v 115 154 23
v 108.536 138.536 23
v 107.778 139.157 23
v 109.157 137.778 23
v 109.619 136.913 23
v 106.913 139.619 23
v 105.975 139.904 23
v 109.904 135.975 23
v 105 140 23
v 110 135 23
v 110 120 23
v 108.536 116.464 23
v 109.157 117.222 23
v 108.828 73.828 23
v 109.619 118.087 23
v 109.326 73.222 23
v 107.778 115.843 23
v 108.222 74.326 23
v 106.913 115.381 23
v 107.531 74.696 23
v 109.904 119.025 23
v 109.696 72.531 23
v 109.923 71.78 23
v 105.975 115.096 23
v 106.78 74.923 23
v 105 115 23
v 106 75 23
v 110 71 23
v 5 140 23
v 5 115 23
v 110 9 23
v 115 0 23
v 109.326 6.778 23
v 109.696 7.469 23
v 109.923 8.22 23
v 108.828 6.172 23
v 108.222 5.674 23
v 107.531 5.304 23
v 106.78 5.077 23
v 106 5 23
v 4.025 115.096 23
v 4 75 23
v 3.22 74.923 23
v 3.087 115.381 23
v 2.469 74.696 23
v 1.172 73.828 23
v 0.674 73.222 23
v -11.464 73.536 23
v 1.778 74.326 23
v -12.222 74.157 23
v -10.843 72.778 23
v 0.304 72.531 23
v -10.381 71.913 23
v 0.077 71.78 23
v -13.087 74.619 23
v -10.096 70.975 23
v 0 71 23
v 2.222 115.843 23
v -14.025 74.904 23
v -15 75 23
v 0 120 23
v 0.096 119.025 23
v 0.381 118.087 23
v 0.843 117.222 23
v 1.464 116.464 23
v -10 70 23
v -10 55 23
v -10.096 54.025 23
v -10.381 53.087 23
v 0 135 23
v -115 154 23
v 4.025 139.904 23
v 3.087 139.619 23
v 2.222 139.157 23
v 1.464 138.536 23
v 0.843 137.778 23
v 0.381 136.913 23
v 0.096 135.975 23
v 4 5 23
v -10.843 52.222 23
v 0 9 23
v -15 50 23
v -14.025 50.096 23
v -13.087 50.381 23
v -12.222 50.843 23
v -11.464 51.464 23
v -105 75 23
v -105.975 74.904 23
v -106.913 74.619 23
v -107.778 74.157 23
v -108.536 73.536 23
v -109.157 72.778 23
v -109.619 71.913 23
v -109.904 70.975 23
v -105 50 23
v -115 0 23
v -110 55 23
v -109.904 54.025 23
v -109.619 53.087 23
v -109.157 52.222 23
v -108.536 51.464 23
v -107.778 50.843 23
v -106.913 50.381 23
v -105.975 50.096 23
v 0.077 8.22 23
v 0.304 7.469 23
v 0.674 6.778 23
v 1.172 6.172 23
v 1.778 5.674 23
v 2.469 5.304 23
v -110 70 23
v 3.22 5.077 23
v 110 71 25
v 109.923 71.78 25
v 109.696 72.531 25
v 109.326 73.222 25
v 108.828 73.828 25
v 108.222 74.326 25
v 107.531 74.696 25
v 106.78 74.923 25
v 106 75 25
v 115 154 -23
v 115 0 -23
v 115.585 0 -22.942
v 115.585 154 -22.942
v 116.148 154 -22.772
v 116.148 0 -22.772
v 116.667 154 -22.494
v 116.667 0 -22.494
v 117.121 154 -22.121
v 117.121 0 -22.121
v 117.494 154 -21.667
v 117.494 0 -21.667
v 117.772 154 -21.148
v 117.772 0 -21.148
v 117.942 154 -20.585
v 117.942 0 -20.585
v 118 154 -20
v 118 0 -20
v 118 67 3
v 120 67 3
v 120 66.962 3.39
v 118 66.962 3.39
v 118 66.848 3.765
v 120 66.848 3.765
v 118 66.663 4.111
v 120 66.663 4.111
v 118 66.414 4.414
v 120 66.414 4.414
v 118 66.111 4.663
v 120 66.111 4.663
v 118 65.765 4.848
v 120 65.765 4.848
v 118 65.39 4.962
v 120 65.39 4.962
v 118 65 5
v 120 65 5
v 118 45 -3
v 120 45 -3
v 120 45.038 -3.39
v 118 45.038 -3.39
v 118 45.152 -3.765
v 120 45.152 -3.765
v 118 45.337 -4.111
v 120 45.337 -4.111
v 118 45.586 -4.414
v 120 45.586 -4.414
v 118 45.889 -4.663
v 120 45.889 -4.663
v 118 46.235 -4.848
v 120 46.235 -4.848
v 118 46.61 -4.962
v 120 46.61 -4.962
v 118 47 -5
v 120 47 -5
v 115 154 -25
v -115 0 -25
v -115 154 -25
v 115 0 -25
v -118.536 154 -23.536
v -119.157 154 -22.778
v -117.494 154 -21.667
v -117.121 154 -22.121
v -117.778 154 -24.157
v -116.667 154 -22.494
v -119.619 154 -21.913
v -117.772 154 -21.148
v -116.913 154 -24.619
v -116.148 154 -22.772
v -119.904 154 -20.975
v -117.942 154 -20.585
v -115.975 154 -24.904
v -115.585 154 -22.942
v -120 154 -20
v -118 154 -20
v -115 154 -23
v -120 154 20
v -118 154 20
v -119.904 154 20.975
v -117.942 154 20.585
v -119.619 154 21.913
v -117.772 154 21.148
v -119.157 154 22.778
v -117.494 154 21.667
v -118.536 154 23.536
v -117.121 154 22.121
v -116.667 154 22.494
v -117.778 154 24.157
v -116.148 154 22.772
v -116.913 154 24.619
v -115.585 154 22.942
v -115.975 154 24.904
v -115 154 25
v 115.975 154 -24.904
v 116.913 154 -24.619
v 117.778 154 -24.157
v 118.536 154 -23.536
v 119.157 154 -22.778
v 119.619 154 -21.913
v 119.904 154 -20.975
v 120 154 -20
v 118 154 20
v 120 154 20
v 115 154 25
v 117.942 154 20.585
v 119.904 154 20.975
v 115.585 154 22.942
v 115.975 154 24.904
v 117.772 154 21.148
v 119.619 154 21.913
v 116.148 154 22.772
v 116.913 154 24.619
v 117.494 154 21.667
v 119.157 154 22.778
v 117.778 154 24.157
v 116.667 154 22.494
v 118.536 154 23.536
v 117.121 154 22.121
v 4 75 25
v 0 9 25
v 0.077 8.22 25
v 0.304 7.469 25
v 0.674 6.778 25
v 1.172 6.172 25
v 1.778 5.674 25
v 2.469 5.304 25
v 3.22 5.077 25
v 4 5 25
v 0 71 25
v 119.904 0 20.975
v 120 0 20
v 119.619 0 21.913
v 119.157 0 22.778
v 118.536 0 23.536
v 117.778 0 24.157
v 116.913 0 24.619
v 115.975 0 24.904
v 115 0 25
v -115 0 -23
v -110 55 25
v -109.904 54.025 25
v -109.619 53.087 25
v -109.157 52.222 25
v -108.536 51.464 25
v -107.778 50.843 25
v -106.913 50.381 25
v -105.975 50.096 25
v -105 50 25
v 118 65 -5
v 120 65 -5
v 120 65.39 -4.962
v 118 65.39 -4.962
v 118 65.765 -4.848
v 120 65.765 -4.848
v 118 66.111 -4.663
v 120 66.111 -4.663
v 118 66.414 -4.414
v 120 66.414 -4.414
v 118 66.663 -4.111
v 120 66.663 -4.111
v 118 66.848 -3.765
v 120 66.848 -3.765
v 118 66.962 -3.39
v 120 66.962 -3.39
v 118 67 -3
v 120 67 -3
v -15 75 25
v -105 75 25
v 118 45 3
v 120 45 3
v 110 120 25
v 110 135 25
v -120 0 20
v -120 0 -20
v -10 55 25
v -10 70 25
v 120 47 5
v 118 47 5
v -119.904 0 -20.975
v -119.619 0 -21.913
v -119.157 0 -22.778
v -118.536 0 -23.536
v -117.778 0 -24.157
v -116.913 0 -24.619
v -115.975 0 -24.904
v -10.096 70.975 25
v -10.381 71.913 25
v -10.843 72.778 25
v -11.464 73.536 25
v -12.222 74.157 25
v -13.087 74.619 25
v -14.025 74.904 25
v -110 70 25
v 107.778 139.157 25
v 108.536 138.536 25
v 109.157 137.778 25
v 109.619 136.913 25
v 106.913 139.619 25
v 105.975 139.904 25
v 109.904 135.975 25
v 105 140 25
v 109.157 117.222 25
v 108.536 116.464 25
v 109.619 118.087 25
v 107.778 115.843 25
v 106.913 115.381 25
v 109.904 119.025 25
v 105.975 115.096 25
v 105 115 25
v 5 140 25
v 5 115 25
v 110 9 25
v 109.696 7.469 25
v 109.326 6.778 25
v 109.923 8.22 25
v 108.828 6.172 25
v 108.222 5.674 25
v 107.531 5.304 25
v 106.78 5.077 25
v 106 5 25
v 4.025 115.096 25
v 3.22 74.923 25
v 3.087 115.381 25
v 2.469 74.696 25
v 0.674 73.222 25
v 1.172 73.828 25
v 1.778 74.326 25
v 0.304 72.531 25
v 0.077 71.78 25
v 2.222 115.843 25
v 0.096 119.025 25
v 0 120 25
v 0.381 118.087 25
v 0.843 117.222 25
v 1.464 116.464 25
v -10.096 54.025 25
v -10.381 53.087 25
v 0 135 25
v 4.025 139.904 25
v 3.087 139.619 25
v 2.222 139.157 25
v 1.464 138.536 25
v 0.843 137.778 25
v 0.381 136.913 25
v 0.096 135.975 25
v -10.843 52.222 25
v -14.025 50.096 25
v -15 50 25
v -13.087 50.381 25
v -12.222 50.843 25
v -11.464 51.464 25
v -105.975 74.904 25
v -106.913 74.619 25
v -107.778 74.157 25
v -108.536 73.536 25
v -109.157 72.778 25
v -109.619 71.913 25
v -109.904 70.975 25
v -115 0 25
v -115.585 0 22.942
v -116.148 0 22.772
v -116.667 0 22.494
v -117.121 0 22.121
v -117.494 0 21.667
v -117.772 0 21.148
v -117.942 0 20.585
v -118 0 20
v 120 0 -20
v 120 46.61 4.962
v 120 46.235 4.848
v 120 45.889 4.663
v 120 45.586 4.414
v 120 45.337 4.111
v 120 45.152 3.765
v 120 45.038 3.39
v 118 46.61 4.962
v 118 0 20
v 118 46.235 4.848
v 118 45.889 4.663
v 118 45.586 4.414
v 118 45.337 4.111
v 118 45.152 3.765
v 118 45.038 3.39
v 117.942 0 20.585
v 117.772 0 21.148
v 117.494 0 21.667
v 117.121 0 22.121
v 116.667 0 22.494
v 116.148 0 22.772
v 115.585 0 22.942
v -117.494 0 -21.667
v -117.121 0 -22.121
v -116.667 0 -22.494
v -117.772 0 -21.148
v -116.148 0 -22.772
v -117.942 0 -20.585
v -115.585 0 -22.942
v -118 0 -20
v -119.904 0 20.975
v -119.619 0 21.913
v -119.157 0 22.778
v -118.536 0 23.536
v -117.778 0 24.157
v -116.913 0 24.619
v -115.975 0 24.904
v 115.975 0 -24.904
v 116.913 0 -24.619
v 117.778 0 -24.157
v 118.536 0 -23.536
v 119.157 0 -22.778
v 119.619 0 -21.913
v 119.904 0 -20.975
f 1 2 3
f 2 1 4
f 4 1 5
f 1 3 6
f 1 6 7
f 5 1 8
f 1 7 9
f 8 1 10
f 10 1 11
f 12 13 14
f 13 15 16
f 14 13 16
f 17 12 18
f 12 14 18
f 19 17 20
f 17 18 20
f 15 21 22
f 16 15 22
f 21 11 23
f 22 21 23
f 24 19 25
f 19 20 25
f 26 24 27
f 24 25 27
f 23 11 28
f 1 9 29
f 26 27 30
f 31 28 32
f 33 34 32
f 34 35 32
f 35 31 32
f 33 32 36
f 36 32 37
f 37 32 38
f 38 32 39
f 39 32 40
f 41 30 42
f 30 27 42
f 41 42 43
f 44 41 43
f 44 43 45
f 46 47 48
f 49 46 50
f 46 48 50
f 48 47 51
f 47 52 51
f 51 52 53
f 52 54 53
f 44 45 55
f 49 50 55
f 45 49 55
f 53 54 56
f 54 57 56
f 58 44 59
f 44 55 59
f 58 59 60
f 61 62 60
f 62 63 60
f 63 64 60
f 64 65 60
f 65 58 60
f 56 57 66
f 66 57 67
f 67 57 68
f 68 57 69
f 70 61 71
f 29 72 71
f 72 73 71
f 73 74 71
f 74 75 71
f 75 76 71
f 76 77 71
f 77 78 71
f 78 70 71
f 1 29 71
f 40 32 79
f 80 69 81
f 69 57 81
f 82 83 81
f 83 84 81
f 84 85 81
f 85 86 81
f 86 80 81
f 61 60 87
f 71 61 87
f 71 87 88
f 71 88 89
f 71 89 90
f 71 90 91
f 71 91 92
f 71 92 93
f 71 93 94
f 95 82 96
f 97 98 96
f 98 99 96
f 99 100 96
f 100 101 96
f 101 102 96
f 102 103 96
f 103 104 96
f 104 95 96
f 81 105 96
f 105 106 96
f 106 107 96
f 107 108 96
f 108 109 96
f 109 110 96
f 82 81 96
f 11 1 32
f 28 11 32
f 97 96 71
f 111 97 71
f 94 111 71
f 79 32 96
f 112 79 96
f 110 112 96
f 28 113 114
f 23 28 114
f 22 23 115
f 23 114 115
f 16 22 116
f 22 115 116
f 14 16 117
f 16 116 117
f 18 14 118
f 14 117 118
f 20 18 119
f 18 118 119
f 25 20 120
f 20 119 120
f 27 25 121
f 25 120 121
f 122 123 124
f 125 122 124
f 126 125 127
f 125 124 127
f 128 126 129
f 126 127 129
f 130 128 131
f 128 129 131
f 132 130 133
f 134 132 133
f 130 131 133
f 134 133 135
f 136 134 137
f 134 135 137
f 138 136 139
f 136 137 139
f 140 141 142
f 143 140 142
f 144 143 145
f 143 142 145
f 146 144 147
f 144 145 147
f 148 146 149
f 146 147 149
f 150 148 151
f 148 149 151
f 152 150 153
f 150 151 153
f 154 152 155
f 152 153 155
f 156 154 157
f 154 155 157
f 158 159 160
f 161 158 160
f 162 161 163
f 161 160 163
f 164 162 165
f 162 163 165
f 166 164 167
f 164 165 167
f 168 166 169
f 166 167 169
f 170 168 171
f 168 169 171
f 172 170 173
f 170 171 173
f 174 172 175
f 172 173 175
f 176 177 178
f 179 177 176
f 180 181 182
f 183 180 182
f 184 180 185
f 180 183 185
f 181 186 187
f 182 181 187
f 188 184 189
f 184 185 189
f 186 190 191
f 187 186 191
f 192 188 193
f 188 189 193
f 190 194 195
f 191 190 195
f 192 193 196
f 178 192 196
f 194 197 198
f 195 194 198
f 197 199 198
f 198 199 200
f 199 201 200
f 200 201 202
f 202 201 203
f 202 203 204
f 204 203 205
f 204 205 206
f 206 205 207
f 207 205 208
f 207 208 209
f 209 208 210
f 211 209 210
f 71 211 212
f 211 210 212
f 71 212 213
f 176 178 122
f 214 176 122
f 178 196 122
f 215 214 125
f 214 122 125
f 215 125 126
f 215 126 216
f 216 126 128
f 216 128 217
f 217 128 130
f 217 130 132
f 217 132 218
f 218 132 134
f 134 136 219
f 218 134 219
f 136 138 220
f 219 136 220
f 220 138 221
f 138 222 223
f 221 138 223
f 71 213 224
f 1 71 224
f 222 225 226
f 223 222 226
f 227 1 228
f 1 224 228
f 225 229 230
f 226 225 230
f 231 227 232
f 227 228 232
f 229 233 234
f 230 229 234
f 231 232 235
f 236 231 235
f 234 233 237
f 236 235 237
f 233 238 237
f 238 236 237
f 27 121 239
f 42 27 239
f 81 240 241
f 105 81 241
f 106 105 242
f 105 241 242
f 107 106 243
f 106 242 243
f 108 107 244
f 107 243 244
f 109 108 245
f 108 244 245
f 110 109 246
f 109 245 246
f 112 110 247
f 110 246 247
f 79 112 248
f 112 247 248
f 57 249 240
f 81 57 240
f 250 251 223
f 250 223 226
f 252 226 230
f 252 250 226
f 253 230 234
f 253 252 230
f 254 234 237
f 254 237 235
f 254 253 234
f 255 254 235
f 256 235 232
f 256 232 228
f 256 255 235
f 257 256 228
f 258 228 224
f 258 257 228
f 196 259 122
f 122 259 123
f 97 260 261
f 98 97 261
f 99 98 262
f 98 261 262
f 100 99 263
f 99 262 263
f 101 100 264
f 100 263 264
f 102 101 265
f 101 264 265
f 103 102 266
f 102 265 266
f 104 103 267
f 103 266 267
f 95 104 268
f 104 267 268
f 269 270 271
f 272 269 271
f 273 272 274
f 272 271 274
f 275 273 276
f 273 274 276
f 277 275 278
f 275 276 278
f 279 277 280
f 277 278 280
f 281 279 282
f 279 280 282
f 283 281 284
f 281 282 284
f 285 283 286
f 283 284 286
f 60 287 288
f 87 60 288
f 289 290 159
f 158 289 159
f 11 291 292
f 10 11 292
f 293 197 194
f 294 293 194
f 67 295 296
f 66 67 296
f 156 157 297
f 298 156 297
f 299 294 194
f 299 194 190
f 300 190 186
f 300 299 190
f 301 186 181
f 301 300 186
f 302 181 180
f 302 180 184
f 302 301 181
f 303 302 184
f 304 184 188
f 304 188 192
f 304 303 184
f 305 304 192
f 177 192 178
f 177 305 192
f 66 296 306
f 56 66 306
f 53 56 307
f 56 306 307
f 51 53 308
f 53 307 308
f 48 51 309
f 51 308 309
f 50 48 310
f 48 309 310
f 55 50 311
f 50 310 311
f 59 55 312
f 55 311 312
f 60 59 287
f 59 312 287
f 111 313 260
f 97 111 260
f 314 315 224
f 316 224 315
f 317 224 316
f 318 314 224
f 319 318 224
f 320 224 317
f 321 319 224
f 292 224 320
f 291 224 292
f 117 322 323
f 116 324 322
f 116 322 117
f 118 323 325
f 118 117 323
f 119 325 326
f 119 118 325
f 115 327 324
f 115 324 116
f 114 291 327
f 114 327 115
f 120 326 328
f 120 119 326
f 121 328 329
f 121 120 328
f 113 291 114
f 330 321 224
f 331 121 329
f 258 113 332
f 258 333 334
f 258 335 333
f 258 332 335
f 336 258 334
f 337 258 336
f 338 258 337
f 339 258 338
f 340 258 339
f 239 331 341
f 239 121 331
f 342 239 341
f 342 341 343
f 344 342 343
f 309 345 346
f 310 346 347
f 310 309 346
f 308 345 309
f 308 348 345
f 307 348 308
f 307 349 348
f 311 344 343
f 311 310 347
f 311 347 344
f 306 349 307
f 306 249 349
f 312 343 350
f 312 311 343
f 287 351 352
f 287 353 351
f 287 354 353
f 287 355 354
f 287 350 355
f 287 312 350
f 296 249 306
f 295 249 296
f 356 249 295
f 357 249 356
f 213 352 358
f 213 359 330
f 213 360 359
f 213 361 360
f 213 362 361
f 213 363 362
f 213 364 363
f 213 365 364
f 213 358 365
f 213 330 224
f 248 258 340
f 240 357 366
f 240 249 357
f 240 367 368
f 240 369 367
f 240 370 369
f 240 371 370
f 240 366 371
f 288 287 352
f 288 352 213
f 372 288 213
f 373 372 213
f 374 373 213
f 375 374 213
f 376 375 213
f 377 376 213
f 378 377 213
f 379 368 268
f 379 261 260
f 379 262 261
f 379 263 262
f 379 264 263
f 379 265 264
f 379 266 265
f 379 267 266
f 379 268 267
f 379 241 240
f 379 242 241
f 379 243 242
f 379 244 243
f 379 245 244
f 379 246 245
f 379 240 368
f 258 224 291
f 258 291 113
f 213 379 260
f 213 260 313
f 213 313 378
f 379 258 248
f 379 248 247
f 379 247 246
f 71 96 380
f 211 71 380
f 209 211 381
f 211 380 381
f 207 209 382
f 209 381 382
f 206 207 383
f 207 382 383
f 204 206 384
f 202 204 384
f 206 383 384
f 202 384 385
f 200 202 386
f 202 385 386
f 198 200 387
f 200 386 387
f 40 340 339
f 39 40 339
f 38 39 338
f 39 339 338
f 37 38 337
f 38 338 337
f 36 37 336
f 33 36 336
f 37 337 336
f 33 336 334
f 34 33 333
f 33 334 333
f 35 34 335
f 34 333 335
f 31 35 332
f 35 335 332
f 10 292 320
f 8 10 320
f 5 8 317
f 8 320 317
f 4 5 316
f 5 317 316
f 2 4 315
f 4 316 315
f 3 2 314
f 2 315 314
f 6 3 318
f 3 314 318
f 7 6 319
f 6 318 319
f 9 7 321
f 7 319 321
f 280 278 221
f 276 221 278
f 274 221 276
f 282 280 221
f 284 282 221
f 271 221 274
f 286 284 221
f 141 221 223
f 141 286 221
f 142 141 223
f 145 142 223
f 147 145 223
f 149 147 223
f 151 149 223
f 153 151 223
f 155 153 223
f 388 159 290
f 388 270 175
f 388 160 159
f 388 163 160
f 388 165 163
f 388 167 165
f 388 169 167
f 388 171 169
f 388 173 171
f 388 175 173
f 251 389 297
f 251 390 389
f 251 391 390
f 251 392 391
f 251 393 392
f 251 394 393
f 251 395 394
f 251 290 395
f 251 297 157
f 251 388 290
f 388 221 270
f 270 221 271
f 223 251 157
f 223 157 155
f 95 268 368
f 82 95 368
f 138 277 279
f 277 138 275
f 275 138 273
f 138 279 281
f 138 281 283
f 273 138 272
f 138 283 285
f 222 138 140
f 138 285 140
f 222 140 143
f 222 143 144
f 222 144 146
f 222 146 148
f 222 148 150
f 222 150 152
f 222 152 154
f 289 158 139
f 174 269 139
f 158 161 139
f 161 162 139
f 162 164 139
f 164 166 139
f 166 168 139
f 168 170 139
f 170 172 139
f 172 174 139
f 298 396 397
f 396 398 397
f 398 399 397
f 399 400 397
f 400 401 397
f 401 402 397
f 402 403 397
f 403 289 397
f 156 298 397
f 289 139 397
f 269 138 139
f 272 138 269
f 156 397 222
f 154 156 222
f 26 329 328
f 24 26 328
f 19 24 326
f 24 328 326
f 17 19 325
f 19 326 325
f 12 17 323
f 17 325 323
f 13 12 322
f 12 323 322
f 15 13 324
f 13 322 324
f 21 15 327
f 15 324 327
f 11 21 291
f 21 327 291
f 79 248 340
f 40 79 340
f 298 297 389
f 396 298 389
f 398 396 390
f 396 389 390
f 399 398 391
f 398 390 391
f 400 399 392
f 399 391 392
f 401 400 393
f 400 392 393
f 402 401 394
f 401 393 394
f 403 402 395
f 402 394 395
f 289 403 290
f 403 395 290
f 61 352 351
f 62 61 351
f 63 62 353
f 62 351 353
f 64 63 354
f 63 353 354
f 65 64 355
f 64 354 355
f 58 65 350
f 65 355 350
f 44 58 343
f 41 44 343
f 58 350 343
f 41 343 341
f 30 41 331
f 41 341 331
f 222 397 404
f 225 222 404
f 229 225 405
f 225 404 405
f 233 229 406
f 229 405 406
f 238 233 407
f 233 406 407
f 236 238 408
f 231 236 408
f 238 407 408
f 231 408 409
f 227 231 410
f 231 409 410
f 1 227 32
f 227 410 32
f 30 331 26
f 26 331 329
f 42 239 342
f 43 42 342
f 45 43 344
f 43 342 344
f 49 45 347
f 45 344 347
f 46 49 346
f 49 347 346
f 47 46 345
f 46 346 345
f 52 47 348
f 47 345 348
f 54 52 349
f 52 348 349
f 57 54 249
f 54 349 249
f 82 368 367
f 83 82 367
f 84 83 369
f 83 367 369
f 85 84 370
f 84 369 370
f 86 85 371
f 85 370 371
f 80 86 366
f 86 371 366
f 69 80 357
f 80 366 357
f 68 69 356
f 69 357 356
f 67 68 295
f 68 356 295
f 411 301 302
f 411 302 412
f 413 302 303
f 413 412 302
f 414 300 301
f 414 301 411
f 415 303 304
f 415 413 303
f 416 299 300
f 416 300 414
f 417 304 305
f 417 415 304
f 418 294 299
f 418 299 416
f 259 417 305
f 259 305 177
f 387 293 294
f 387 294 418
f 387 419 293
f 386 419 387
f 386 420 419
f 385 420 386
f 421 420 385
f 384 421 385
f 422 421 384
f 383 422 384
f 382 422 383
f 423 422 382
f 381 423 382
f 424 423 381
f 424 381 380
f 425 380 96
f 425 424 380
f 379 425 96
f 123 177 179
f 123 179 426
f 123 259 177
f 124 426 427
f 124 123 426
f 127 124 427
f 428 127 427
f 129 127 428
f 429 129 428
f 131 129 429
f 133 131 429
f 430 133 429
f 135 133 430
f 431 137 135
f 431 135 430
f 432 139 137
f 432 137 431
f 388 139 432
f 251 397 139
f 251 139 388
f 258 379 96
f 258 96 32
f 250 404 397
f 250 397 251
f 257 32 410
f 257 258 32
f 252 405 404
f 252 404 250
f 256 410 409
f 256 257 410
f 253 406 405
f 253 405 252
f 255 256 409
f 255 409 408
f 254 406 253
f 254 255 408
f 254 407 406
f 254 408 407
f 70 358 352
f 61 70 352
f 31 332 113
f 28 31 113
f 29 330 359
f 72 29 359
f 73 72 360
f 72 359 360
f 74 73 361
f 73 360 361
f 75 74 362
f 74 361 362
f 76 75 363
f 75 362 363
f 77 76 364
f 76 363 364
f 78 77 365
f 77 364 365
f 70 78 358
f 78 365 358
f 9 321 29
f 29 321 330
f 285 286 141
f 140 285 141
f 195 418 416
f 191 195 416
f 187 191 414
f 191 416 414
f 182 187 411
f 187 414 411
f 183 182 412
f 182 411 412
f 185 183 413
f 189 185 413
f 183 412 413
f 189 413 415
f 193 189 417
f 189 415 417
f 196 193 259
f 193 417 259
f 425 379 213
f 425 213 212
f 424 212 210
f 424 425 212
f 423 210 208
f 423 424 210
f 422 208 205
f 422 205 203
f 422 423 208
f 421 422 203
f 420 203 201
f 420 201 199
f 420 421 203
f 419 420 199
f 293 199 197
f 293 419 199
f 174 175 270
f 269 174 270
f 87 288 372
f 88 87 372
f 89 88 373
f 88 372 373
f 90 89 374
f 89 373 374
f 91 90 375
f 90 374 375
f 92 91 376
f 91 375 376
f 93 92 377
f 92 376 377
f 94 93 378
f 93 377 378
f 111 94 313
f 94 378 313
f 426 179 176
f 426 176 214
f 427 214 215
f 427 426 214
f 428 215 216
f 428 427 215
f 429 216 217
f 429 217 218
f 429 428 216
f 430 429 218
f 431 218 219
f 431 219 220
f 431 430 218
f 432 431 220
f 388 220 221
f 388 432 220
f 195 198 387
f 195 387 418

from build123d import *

# Parameters (mm, degrees)
PAD001_DEPTH    = 154
POCKET_DEPTH    = 5
POCKET001_DEPTH = 5


with BuildPart() as part:
    # Sketch001 (on XZ_Plane001 of Origin002) → Pad001 (new body)
    with BuildSketch(Plane.XZ):
        with BuildLine():
            Line((-120, 20), (-120, -20))
            ThreePointArc((-120, -20), (-118.535534, -23.535534), (-115, -25))
            Line((-115, -25), (115, -25))
            ThreePointArc((115, -25), (118.535534, -23.535534), (120, -20))
            Line((120, -20), (120, 20))
            ThreePointArc((120, 20), (118.535534, 23.535534), (115, 25))
            Line((115, 25), (-115, 25))
            ThreePointArc((-115, 25), (-118.535534, 23.535534), (-120, 20))
        make_face()
        with BuildLine():
            Line((-118, 20), (-118, -20))
            ThreePointArc((-118, -20), (-117.12132, -22.12132), (-115, -23))
            Line((-115, -23), (115, -23))
            ThreePointArc((115, -23), (117.12132, -22.12132), (118, -20))
            Line((118, -20), (118, 20))
            ThreePointArc((118, 20), (117.12132, 22.12132), (115, 23))
            Line((115, 23), (-115, 23))
            ThreePointArc((-115, 23), (-117.12132, 22.12132), (-118, 20))
        make_face(mode=Mode.SUBTRACT)
    extrude(amount=-PAD001_DEPTH)

    # Sketch003 (on Face7 of Pad001) → Pocket (cut)
    with BuildSketch(Plane.XY.offset(25)):
        with BuildLine():
            Line((106, 75), (4, 75))
            ThreePointArc((4, 75), (1.171573, 73.828427), (0, 71))
            Line((0, 71), (0, 9))
            ThreePointArc((0, 9), (1.171573, 6.171573), (4, 5))
            Line((4, 5), (106, 5))
            ThreePointArc((106, 5), (108.828427, 6.171573), (110, 9))
            Line((110, 9), (110, 71))
            ThreePointArc((110, 71), (108.828427, 73.828427), (106, 75))
        make_face()
        with BuildLine():
            Line((-110, 70), (-110, 55))
            ThreePointArc((-110, 55), (-108.535534, 51.464466), (-105, 50))
            Line((-105, 50), (-15, 50))
            ThreePointArc((-15, 50), (-11.464466, 51.464466), (-10, 55))
            Line((-10, 55), (-10, 70))
            ThreePointArc((-10, 70), (-11.464466, 73.535534), (-15, 75))
            Line((-15, 75), (-105, 75))
            ThreePointArc((-105, 75), (-108.535534, 73.535534), (-110, 70))
        make_face()
        with BuildLine():
            Line((0, 135), (0, 120))
            ThreePointArc((0, 120), (1.464466, 116.464466), (5, 115))
            Line((5, 115), (105, 115))
            ThreePointArc((105, 115), (108.535534, 116.464466), (110, 120))
            Line((110, 120), (110, 135))
            ThreePointArc((110, 135), (108.535534, 138.535534), (105, 140))
            Line((105, 140), (5, 140))
            ThreePointArc((5, 140), (1.464466, 138.535534), (0, 135))
        make_face()
    extrude(amount=-POCKET_DEPTH, mode=Mode.SUBTRACT)

    # Sketch004 (on Face9 of Pocket) → Pocket001 (cut)
    with BuildSketch(Plane.YZ.offset(120)):
        with BuildLine():
            Line((45, 3), (45, -3))
            ThreePointArc((45, -3), (45.585786, -4.414214), (47, -5))
            Line((47, -5), (65, -5))
            ThreePointArc((65, -5), (66.414214, -4.414214), (67, -3))
            Line((67, -3), (67, 3))
            ThreePointArc((67, 3), (66.414214, 4.414214), (65, 5))
            Line((65, 5), (47, 5))
            ThreePointArc((47, 5), (45.585786, 4.414214), (45, 3))
        make_face()
    extrude(amount=-POCKET001_DEPTH, mode=Mode.SUBTRACT)


solid = part.part
